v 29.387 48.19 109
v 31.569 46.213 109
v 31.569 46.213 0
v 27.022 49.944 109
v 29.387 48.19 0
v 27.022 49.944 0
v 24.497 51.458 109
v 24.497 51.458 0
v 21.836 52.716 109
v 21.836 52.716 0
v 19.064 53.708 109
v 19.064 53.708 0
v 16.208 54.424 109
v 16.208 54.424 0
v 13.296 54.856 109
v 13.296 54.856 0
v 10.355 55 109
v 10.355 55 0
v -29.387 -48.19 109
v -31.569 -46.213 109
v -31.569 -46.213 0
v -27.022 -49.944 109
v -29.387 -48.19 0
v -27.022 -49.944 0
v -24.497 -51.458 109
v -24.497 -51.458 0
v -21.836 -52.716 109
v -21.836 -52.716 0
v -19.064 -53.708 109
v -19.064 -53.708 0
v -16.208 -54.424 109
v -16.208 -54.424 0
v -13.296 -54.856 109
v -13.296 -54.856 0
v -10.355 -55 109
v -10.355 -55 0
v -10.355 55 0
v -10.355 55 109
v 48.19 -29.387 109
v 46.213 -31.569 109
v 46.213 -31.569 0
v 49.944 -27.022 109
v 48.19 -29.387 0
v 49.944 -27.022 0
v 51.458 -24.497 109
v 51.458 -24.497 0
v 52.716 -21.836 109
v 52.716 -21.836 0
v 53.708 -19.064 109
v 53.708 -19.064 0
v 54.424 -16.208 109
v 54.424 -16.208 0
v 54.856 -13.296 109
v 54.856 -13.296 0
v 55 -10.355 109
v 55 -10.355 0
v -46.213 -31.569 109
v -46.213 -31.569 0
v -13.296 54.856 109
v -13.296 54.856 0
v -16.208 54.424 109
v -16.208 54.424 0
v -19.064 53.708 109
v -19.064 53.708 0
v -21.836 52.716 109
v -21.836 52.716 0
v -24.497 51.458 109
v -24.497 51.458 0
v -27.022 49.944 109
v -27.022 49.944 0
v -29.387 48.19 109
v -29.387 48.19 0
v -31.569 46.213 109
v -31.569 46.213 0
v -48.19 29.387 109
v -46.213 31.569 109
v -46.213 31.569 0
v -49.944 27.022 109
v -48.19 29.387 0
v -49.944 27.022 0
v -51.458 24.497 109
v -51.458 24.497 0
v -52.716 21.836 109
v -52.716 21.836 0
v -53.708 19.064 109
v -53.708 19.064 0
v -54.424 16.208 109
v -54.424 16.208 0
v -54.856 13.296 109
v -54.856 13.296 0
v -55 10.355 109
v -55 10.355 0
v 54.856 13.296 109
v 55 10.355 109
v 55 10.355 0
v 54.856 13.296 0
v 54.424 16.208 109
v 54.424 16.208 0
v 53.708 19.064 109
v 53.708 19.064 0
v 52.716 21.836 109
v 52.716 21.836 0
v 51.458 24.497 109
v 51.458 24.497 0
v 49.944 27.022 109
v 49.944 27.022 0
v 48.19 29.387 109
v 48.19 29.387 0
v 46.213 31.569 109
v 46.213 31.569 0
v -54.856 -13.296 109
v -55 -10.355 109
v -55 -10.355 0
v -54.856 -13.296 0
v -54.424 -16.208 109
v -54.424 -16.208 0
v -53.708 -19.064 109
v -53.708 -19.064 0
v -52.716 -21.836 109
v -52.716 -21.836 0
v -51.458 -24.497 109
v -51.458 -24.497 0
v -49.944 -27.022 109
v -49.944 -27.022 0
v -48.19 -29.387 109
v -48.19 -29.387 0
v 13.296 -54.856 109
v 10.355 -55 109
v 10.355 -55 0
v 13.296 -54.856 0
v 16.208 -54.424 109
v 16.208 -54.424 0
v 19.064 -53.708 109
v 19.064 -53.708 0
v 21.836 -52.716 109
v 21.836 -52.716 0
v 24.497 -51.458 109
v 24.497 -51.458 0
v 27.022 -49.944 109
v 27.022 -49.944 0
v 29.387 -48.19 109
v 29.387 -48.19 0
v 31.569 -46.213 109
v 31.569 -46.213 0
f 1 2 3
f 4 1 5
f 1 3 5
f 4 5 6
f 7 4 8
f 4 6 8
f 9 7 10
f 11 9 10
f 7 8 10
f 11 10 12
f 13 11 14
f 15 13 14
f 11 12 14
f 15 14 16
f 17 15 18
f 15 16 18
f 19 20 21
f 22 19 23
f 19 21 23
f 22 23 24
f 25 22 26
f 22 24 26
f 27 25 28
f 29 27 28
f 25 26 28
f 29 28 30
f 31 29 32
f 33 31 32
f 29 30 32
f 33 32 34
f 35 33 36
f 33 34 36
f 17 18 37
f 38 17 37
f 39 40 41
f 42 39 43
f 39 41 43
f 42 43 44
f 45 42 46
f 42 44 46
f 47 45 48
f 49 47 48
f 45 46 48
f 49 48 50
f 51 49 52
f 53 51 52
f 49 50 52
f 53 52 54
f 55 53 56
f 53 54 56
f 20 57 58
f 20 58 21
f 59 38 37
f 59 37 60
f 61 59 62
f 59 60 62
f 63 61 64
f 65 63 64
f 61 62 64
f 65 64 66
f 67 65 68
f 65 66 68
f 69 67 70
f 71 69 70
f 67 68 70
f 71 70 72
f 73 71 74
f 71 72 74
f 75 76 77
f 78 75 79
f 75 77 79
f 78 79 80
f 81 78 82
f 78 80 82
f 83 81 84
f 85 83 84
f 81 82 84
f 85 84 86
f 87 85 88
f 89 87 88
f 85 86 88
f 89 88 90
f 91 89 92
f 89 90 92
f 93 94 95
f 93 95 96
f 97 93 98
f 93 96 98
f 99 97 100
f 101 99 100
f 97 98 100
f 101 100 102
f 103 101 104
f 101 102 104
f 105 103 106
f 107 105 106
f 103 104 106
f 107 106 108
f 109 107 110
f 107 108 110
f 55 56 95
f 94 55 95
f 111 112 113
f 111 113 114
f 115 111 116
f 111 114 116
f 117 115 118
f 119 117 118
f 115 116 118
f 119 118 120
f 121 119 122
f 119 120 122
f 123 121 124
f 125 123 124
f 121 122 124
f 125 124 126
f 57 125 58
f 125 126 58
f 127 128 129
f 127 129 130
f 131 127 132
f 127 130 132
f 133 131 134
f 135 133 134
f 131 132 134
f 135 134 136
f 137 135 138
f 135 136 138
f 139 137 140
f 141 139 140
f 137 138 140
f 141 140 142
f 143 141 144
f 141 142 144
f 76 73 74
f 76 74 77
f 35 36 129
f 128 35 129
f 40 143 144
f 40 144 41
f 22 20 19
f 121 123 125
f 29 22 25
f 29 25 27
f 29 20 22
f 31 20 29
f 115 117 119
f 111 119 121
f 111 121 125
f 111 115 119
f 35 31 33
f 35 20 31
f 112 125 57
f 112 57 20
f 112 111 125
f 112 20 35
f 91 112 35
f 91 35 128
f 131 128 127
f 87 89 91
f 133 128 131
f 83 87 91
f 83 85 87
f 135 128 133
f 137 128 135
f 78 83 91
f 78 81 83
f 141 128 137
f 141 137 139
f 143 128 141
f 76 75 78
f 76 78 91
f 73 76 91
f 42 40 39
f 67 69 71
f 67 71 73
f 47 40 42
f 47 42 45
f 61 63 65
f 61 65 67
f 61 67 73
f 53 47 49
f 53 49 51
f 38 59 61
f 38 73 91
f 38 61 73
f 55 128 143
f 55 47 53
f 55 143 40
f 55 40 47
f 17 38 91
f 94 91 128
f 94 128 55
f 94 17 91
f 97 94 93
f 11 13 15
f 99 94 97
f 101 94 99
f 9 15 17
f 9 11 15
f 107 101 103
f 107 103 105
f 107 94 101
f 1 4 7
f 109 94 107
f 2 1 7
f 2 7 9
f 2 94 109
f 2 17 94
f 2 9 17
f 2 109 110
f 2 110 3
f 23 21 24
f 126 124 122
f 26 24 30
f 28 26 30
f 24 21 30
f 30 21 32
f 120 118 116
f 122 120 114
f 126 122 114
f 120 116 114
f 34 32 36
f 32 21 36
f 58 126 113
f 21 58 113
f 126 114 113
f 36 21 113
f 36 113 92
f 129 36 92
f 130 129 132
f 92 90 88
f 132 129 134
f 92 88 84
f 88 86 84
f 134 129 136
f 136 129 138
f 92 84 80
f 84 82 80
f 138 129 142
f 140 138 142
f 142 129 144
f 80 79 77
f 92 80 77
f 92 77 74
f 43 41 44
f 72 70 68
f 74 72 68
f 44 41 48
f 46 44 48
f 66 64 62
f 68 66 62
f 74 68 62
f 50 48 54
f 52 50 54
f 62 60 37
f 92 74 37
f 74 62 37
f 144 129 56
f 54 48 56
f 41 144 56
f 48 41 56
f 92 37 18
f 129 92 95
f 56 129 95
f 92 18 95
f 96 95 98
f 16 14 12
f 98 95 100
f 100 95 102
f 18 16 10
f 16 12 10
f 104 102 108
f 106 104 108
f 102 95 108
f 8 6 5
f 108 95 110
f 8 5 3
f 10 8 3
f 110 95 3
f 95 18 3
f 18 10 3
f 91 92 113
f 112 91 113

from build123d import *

# Parameters (mm, degrees)
RESSALTO_EXTRUS_O1_DEPTH = 109


with BuildPart() as part:
    # Esboço1 → Ressalto-extrusão1 (new body)
    with BuildSketch(Plane.XY):
        with BuildLine():
            Line((55, -10.355339059), (55, 10.355339059))
            ThreePointArc((55, 10.355339059), (52.716385975, 21.83584203), (46.213203436, 31.568542495))
            Line((46.213203436, 31.568542495), (31.568542495, 46.213203436))
            ThreePointArc((31.568542495, 46.213203436), (21.83584203, 52.716385975), (10.355339059, 55))
            Line((10.355339059, 55), (-10.355339059, 55))
            ThreePointArc((-10.355339059, 55), (-21.83584203, 52.716385975), (-31.568542495, 46.213203436))
            Line((-31.568542495, 46.213203436), (-46.213203436, 31.568542495))
            ThreePointArc((-46.213203436, 31.568542495), (-52.716385975, 21.83584203), (-55, 10.355339059))
            Line((-55, 10.355339059), (-55, -10.355339059))
            ThreePointArc((-55, -10.355339059), (-52.716385975, -21.83584203), (-46.213203436, -31.568542495))
            Line((-46.213203436, -31.568542495), (-31.568542495, -46.213203436))
            ThreePointArc((-31.568542495, -46.213203436), (-21.83584203, -52.716385975), (-10.355339059, -55))
            Line((-10.355339059, -55), (10.355339059, -55))
            ThreePointArc((10.355339059, -55), (21.83584203, -52.716385975), (31.568542495, -46.213203436))
            Line((31.568542495, -46.213203436), (46.213203436, -31.568542495))
            ThreePointArc((46.213203436, -31.568542495), (52.716385975, -21.83584203), (55, -10.355339059))
        make_face()
    extrude(amount=RESSALTO_EXTRUS_O1_DEPTH)


solid = part.part
